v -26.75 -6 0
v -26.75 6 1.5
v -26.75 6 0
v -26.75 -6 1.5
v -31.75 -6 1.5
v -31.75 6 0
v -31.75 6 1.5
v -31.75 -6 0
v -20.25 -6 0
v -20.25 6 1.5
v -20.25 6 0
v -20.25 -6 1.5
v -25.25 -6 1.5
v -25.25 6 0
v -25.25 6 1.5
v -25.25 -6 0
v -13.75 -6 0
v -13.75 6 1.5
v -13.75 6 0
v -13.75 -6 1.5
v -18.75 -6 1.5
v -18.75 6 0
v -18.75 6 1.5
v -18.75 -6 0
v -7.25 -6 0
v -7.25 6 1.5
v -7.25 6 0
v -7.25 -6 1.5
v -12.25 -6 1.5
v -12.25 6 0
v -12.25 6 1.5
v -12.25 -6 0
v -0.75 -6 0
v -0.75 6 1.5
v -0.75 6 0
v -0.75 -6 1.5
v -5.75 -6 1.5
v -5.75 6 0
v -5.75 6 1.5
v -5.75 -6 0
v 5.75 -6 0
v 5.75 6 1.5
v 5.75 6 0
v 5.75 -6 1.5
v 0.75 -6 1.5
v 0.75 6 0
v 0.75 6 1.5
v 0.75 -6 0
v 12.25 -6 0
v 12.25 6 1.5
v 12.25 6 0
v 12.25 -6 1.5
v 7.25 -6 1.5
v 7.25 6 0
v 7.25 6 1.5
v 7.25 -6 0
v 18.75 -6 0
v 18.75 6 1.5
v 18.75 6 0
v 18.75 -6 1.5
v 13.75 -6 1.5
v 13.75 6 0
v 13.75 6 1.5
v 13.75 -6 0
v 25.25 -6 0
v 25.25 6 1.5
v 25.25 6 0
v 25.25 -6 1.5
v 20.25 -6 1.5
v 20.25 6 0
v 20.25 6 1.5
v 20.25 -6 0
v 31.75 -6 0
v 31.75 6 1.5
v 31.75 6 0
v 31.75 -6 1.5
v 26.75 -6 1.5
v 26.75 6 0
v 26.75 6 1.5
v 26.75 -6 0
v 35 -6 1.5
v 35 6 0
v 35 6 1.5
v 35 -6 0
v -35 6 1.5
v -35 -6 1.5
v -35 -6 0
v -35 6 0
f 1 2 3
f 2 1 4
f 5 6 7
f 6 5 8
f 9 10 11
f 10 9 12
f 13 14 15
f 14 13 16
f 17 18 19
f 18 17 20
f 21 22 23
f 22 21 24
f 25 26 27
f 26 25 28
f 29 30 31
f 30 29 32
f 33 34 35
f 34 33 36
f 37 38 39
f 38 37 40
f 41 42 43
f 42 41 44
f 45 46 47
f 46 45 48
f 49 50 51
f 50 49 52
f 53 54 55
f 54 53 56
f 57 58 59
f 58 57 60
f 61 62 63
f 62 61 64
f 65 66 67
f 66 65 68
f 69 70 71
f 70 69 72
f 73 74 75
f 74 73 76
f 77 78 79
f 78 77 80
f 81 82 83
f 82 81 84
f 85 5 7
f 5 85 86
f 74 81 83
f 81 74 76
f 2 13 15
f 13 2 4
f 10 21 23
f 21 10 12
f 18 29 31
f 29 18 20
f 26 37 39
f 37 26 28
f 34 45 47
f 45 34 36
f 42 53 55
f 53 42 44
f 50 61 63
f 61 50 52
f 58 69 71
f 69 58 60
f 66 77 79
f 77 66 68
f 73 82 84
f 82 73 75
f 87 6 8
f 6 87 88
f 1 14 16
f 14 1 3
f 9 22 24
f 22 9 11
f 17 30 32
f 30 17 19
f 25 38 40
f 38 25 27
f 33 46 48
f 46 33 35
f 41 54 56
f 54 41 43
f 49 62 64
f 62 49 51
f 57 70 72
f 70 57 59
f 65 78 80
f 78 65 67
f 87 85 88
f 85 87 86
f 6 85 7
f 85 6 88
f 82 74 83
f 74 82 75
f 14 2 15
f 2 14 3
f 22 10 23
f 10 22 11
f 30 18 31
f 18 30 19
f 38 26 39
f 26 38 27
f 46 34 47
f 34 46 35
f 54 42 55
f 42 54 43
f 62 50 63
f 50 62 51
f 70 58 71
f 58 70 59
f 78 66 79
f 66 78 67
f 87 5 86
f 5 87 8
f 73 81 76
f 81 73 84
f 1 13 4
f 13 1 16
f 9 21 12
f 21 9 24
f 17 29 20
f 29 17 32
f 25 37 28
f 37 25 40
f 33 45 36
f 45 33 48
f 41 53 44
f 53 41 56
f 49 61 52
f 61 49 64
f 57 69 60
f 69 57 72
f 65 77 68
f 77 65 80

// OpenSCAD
// 10-well agarose gel casting comb
// Print orientation: flat on bed, teeth pointing down (-Y)

$fn = 64;

// ---- Dimensions (mm) ----
plate_t      = 1.5;   // plate thickness (Z)
spine_l      = 70;    // spine length (X)
spine_w      = 12;    // spine width (Y)
tooth_n      = 10;    // number of teeth
tooth_w      = 5.0;   // tooth width (X)
tooth_l      = 12;    // tooth length (Y)
gap          = 1.5;   // gap between teeth (X)
eps          = 0.5;   // cutter overshoot past faces (Z)

// ---- Derived ----
pitch   = tooth_w + gap;            // centre-to-centre spacing
x_start = -(tooth_n - 1) * pitch / 2;  // first tooth centre (row centred)

// ---- Model ----
difference() {
    // Base plate
    translate([-spine_l/2, -spine_w/2, 0])
        cube([spine_l, spine_w, plate_t]);

    // Teeth cut from the plate
    for (i = [0 : tooth_n - 1])
        translate([x_start + i * pitch - tooth_w/2,
                   -tooth_l/2 - eps,
                   -eps])
            cube([tooth_w, tooth_l + 2*eps, plate_t + 2*eps]);
}
